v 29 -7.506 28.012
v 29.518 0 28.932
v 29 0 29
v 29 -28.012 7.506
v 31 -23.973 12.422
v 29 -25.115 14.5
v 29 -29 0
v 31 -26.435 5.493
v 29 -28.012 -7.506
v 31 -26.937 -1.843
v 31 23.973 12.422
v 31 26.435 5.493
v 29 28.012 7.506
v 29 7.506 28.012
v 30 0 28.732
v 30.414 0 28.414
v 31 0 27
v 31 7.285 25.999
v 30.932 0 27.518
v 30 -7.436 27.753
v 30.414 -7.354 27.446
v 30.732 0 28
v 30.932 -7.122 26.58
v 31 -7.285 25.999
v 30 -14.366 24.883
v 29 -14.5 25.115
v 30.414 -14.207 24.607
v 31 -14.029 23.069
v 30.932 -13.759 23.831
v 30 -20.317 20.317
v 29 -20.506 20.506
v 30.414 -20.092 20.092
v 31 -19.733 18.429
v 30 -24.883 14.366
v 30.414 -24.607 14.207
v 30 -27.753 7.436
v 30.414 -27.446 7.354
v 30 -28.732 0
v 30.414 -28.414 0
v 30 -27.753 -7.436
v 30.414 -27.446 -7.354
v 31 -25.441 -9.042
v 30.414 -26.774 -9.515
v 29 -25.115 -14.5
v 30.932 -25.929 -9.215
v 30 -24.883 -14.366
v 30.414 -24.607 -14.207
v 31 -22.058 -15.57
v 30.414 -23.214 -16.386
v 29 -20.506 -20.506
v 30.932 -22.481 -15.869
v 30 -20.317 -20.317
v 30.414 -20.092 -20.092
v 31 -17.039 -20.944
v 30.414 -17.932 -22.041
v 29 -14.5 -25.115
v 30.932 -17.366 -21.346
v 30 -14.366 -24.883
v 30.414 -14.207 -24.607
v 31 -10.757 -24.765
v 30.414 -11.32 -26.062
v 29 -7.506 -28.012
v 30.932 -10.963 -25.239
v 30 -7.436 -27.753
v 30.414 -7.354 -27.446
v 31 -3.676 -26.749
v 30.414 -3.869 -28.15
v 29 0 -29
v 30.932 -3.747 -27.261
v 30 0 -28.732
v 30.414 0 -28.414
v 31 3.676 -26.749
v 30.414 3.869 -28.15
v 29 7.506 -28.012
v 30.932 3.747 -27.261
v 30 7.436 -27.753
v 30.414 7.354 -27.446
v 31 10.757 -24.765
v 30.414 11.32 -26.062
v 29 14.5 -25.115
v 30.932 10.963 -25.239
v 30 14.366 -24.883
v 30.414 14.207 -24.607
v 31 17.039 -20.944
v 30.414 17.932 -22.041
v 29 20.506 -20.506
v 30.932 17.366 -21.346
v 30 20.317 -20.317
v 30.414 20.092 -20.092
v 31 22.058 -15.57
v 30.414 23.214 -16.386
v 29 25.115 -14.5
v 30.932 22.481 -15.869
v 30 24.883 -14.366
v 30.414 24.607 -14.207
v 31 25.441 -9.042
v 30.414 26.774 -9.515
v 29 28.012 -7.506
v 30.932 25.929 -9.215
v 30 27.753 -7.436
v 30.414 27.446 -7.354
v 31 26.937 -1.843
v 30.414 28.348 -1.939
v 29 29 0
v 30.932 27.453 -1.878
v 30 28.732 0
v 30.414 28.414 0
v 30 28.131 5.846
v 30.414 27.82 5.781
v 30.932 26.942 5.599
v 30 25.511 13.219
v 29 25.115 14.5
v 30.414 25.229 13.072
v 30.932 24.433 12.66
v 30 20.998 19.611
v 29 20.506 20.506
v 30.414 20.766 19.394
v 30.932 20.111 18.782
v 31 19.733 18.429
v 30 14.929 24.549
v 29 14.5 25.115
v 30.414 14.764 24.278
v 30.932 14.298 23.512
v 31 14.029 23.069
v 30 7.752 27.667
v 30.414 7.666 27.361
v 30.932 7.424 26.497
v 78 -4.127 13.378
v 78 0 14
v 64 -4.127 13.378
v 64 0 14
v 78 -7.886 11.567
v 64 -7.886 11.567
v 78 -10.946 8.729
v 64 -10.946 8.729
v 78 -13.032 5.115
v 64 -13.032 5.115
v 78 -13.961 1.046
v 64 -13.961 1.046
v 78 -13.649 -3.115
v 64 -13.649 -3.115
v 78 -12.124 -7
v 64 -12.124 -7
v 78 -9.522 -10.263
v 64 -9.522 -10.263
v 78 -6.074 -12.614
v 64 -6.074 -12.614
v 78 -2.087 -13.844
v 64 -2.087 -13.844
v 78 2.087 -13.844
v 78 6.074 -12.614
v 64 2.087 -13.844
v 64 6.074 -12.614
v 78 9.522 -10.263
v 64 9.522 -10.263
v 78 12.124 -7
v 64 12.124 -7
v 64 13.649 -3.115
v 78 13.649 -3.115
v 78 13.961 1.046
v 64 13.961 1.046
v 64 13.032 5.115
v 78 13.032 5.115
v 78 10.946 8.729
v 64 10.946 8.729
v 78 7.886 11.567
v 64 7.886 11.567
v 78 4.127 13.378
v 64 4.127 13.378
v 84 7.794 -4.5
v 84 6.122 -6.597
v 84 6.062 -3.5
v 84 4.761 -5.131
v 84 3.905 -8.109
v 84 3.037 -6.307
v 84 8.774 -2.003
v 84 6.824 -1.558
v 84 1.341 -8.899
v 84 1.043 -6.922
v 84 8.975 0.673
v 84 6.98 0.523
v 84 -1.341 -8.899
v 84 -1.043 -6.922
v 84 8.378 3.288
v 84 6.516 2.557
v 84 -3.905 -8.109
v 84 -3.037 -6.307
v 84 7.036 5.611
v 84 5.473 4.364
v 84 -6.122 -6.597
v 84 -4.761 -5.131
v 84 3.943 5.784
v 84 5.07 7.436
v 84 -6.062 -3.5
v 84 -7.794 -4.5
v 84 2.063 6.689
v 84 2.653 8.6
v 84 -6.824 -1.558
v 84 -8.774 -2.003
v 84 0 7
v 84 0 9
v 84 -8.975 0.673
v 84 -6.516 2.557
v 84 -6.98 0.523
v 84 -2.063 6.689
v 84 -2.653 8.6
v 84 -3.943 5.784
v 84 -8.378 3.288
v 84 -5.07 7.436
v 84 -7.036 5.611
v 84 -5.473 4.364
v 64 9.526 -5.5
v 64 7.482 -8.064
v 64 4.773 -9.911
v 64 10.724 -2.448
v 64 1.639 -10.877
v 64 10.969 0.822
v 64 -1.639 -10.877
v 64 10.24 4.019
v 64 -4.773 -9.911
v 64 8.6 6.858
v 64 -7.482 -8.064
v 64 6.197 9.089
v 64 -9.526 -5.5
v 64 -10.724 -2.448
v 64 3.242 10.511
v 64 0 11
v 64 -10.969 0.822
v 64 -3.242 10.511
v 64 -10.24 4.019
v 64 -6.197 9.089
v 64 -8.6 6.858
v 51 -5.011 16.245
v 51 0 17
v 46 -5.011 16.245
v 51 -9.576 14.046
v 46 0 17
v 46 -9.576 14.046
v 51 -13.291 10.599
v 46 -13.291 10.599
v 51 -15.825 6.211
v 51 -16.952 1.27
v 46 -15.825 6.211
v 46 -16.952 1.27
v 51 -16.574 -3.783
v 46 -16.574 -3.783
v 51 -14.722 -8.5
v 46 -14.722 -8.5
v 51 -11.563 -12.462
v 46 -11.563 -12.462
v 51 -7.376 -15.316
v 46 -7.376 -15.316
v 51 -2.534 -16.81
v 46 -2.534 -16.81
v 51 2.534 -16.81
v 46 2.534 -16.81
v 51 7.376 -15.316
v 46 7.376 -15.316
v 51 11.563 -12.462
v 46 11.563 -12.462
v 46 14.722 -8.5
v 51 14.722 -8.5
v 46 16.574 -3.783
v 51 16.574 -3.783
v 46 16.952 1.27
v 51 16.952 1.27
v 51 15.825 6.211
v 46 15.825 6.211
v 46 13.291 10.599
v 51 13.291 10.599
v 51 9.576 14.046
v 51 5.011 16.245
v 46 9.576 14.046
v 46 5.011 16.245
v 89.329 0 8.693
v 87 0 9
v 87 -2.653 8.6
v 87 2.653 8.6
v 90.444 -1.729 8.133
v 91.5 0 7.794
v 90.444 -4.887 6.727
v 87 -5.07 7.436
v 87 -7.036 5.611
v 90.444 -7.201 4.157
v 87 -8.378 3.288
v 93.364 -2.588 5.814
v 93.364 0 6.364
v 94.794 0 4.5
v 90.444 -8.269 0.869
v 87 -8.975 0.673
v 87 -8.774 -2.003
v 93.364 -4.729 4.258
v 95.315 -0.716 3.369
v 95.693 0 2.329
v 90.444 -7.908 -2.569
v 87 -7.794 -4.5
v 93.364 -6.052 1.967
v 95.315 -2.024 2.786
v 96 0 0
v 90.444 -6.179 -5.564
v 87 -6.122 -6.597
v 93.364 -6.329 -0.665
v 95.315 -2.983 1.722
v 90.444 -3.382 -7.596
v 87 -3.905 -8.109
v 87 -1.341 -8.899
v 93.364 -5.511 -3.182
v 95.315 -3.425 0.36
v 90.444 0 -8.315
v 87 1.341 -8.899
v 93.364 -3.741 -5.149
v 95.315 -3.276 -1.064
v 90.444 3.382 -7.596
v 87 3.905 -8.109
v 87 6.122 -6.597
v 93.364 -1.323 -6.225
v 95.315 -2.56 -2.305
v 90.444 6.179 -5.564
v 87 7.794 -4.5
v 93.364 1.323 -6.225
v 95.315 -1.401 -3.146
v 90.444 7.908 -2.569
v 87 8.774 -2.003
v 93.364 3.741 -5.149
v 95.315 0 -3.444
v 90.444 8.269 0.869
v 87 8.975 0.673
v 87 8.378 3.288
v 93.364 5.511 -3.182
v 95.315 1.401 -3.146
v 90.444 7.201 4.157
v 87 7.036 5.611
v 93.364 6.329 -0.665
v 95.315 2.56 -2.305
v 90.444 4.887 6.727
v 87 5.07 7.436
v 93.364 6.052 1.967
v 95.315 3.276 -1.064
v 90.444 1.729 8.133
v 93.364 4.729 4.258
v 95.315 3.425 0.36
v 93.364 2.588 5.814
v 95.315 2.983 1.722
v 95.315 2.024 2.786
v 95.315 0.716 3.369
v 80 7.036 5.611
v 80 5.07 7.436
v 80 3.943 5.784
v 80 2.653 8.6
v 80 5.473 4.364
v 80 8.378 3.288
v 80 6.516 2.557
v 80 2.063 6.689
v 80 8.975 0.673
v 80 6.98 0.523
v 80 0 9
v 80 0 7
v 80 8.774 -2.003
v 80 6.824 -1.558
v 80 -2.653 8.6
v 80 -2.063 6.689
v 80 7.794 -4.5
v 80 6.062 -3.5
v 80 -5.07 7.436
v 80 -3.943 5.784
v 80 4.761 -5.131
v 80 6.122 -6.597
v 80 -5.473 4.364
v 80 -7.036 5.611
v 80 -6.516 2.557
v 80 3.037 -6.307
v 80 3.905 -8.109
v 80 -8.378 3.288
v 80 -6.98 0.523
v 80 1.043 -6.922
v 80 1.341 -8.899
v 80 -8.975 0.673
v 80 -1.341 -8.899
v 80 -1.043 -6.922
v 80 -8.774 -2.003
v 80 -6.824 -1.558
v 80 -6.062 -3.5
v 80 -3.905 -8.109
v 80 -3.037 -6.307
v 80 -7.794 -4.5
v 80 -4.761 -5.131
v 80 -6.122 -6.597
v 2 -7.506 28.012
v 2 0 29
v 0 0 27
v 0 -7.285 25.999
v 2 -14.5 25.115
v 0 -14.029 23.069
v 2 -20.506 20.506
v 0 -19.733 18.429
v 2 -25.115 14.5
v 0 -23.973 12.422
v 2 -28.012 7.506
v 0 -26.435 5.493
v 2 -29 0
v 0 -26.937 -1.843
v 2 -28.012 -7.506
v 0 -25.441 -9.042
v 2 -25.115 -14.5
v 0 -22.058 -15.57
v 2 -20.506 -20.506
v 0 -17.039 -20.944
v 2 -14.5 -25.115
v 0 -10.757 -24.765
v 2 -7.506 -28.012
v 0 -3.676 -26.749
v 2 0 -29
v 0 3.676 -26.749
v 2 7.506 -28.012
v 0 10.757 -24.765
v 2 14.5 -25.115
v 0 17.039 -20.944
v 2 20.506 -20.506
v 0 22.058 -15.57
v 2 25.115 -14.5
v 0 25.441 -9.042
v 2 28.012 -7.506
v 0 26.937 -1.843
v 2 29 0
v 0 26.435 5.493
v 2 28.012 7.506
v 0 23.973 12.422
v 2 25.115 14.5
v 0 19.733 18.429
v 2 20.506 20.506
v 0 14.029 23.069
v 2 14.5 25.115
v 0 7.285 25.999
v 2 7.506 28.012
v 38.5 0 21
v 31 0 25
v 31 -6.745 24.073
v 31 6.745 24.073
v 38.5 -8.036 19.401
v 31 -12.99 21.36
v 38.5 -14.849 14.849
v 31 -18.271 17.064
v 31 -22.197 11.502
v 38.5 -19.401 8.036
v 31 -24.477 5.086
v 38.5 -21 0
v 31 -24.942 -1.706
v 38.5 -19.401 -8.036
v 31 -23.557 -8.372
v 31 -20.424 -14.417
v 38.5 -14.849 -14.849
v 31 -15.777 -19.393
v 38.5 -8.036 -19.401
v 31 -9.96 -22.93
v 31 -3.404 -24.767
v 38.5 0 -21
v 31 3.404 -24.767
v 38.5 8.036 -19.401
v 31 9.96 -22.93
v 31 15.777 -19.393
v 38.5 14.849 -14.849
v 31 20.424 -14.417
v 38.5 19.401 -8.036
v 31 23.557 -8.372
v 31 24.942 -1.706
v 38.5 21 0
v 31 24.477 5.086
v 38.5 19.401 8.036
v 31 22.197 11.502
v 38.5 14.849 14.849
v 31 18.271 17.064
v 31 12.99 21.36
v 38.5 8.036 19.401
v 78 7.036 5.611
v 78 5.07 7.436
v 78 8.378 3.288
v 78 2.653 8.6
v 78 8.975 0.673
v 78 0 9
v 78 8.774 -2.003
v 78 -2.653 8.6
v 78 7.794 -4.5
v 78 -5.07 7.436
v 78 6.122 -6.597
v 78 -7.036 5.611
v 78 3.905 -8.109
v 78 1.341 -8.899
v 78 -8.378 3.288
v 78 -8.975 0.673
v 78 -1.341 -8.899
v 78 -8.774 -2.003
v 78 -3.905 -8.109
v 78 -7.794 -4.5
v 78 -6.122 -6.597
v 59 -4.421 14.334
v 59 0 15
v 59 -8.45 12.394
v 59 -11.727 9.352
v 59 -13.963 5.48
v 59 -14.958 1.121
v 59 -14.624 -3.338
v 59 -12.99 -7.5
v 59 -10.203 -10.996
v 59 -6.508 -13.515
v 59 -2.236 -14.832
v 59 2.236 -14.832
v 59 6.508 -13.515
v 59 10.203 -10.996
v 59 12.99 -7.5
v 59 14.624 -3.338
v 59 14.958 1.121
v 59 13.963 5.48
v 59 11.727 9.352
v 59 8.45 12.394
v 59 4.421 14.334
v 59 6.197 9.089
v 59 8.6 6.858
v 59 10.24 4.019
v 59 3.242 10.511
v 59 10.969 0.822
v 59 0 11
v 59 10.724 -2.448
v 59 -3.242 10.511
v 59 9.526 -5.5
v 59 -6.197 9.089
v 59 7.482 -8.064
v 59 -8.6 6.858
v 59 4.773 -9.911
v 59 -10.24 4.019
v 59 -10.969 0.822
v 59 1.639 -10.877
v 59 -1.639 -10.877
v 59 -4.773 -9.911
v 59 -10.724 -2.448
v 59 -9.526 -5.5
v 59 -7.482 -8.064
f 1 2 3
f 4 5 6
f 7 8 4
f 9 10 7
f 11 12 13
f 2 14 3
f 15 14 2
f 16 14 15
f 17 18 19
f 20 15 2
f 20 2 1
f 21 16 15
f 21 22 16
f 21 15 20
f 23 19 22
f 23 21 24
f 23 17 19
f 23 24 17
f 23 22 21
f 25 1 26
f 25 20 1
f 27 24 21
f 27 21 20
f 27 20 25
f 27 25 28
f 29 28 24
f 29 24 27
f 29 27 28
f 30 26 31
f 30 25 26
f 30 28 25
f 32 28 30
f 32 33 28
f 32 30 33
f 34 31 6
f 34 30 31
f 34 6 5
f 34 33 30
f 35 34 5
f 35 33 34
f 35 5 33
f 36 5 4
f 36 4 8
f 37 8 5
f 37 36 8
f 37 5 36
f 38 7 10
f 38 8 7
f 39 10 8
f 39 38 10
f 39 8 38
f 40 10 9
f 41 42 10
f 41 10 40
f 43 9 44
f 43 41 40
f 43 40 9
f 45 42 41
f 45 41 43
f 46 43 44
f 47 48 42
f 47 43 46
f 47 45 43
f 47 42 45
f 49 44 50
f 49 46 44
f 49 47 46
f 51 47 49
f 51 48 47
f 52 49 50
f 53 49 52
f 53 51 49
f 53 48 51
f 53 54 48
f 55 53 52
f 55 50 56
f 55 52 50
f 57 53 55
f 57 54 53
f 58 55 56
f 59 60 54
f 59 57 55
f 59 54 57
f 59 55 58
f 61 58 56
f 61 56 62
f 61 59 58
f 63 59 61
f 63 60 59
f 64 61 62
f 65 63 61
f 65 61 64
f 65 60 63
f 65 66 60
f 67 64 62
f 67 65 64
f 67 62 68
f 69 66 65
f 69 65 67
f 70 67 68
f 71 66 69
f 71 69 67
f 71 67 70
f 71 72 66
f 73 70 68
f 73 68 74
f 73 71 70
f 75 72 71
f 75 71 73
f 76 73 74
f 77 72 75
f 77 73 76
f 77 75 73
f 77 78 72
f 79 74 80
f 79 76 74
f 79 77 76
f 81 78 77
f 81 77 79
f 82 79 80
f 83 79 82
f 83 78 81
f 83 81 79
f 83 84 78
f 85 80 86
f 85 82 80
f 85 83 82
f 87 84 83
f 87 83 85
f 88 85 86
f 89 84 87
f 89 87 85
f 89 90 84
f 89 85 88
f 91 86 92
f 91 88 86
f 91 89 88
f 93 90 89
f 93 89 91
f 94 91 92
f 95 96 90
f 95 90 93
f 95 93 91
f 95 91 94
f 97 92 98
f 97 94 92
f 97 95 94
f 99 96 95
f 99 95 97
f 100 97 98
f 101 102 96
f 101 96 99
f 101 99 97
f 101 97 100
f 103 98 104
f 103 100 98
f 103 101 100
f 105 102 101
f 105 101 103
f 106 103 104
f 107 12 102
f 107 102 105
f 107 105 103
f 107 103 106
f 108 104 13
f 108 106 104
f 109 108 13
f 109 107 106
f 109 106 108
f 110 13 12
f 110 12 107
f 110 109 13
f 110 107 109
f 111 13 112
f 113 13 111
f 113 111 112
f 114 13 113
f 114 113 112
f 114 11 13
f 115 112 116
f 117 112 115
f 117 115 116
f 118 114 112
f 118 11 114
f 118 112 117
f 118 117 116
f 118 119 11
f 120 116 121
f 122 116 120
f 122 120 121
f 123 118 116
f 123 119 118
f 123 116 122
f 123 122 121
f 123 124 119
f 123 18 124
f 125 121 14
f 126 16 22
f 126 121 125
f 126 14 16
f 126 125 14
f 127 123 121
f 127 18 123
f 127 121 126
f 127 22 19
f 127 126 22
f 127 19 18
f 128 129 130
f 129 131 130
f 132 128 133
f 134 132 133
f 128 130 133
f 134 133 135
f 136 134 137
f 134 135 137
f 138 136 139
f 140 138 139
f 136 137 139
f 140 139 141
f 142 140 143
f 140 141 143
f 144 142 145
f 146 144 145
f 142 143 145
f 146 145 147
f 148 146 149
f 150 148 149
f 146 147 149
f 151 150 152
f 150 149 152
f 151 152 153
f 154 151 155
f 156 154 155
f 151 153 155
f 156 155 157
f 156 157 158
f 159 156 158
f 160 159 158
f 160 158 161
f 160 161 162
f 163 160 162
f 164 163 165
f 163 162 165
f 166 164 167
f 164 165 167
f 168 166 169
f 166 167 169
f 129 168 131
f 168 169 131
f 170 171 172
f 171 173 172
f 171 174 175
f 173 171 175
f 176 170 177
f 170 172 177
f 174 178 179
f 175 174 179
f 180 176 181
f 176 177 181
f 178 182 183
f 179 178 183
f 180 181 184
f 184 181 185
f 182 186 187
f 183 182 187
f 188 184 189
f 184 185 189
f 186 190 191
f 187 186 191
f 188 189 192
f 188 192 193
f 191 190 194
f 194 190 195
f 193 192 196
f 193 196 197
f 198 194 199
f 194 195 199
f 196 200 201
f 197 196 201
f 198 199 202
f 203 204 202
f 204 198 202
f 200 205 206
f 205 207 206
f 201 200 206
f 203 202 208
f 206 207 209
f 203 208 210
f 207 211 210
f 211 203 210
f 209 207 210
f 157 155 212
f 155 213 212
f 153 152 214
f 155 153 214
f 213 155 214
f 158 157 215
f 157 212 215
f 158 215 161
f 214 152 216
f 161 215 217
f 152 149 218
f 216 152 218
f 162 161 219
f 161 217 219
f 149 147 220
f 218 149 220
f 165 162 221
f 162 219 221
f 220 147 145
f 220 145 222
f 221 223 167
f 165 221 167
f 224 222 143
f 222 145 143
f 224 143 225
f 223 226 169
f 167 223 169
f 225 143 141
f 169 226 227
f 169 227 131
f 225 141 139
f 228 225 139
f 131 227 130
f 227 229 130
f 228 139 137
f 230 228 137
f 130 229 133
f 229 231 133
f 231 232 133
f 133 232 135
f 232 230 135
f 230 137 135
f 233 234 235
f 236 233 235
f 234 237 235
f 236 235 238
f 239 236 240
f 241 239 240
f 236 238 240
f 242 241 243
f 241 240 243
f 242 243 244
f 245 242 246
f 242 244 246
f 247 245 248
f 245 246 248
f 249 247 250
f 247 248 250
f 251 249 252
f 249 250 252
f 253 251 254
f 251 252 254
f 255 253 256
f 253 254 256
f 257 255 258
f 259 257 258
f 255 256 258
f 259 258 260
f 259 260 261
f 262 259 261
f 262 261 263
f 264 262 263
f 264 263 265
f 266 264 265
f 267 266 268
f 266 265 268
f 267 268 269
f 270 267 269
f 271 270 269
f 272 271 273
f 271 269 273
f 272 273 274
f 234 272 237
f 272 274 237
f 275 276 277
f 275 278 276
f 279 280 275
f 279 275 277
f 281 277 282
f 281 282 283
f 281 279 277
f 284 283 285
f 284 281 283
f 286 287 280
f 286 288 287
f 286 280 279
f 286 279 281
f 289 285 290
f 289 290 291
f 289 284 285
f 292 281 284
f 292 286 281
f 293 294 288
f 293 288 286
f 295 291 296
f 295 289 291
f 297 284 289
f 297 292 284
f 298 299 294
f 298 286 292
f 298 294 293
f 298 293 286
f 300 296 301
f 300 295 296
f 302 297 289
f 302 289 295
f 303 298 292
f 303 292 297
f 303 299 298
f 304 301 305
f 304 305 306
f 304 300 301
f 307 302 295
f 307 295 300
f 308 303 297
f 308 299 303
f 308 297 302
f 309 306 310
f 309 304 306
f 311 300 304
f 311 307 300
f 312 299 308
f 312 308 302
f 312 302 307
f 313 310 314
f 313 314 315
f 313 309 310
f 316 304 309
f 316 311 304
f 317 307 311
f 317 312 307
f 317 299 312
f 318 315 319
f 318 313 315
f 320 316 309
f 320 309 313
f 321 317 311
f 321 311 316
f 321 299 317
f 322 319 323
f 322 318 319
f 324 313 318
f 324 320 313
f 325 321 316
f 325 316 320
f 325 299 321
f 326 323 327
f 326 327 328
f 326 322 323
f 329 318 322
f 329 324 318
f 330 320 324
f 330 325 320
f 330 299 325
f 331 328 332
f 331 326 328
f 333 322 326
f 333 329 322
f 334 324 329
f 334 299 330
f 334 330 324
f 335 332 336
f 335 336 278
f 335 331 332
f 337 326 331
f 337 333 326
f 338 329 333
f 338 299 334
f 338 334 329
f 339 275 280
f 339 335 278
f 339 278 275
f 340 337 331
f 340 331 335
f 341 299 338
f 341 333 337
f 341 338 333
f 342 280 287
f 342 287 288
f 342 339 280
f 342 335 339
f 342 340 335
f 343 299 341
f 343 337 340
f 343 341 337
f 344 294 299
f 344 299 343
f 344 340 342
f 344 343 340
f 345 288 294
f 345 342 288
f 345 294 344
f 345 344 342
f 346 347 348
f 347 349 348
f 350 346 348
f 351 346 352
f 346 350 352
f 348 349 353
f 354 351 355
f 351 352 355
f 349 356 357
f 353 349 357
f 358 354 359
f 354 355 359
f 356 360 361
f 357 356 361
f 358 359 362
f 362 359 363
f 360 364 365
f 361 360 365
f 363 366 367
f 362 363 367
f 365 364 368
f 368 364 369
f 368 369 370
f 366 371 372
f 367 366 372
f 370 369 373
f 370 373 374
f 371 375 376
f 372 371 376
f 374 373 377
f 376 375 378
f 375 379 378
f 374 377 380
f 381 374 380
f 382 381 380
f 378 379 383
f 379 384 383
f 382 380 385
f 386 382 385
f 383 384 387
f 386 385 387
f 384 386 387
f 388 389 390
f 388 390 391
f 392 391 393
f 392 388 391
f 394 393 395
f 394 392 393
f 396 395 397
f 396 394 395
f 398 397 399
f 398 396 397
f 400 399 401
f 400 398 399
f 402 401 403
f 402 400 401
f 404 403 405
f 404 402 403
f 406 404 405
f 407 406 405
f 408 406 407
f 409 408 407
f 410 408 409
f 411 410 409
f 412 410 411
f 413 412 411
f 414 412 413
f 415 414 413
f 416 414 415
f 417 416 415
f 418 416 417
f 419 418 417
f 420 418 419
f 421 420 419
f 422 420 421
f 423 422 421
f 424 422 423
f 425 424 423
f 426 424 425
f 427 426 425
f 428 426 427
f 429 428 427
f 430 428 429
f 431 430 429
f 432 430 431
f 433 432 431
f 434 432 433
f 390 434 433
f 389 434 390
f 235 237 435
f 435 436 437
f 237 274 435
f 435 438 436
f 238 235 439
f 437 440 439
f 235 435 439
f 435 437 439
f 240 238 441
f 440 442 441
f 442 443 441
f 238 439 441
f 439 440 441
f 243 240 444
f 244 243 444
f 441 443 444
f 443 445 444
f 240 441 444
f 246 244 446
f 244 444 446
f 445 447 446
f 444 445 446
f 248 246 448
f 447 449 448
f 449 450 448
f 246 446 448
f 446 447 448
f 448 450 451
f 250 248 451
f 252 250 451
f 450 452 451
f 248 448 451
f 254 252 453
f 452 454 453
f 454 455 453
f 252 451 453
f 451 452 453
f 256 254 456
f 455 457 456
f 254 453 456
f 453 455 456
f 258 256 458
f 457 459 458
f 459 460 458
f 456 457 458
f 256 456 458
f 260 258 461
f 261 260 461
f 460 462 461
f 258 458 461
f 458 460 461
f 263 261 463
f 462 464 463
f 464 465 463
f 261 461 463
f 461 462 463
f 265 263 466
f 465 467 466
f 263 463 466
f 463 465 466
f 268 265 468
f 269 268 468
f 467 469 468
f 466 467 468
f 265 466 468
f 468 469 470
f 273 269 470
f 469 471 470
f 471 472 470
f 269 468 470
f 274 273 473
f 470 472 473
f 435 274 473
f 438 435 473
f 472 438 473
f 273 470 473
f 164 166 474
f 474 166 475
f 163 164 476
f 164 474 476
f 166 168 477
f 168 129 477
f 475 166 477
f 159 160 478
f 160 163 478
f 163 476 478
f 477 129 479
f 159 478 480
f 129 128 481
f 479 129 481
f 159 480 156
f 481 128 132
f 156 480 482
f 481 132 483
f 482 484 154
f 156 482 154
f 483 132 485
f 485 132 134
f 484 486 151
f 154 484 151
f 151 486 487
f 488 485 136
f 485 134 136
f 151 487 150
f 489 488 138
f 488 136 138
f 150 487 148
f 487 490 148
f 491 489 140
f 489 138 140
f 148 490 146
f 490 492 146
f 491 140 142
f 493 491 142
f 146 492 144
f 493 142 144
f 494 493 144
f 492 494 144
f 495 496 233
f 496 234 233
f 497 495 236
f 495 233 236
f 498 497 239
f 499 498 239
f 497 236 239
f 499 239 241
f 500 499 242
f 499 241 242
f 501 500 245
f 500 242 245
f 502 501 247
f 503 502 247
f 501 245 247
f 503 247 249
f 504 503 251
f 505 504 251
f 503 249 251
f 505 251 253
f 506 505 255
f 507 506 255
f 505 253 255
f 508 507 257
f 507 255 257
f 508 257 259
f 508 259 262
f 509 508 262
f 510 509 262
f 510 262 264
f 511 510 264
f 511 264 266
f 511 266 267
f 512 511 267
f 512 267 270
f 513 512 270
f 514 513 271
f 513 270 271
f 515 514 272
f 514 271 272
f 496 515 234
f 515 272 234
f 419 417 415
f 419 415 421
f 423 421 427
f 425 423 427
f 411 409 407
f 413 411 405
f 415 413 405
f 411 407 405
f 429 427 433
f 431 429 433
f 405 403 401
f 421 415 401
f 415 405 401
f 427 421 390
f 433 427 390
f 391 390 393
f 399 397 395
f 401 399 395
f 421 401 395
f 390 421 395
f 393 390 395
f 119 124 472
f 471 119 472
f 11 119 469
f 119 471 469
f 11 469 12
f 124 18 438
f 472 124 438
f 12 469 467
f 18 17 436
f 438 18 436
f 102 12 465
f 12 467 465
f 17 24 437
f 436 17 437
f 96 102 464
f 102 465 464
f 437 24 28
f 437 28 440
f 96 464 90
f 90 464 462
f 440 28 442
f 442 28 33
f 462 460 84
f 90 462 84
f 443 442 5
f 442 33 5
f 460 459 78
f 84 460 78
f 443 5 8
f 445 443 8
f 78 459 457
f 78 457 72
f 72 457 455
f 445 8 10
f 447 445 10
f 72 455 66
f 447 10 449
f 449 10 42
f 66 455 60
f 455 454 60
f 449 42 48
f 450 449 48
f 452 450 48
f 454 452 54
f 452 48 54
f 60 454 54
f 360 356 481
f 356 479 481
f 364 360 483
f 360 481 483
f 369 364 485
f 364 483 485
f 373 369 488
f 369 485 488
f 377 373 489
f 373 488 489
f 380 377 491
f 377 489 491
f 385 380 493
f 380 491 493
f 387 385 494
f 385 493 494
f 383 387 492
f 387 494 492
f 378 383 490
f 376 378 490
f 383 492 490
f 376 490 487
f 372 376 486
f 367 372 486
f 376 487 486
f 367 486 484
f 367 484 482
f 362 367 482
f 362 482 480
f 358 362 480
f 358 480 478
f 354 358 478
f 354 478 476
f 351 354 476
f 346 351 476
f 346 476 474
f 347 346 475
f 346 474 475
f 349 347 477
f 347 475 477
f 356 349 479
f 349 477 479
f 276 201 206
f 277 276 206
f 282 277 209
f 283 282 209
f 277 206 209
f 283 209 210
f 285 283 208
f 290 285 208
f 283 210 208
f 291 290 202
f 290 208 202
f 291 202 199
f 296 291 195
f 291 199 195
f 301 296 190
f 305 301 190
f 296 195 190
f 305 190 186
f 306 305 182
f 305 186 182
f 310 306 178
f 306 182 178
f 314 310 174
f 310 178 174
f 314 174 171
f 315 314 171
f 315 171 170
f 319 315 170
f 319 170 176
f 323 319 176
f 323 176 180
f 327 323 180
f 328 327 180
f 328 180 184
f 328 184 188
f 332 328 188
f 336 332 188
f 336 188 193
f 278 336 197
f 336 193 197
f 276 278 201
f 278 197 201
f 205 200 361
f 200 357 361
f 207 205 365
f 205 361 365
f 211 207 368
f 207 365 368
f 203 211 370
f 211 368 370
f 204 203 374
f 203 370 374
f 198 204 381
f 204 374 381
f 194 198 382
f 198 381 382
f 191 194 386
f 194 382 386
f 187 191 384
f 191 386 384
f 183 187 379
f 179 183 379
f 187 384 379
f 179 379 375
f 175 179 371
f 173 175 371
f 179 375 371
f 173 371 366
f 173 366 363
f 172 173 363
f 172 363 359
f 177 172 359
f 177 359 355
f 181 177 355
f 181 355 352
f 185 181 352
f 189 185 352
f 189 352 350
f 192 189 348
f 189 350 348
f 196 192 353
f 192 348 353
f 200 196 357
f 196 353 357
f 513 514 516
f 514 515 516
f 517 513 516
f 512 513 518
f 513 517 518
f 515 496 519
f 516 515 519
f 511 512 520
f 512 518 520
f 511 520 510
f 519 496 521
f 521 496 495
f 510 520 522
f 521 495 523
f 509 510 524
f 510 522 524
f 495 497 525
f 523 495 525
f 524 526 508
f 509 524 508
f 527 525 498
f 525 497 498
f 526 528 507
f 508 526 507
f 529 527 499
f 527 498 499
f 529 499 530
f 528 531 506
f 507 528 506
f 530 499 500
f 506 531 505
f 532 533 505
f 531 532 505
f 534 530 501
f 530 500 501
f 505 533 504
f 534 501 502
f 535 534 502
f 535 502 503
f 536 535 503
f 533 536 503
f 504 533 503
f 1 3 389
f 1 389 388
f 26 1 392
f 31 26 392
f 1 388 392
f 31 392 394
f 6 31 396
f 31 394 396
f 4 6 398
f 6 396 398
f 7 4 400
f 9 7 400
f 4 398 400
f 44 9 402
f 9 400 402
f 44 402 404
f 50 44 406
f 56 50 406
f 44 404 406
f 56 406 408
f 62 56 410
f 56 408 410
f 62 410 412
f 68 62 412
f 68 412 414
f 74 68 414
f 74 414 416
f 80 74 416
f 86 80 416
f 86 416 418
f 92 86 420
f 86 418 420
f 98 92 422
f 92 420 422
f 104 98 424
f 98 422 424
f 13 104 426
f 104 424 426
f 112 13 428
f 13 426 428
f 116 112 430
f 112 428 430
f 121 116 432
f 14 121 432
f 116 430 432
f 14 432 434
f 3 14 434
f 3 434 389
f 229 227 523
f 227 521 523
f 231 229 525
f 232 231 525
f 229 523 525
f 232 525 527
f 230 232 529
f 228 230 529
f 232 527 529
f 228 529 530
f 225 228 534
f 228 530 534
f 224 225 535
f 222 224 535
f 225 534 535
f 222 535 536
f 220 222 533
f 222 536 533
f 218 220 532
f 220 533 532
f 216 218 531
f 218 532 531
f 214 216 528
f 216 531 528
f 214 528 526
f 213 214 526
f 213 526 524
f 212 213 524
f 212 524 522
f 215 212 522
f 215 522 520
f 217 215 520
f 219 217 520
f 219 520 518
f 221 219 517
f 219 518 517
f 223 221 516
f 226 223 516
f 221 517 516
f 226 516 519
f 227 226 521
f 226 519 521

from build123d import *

# Parameters (mm, degrees)
F2_SIZE = 2
F3_R    = 2
F4_R    = 9


with BuildPart() as f1:
    # F0 (on Front) → F1 (revolve)
    with BuildSketch(Plane.XZ):
        Polygon((0, 29), (0, 0), (96, 0), (96, 9), (84, 9), (84, 7), (80, 7), (80, 9), (78, 9), (78, 14), (64, 14), (64, 11), (59, 11), (59, 15), (51, 17), (46, 17), (31, 25), (31, 29), align=None)
    revolve(axis=Axis((48, 0, 0), (1, 0, 0)))

    # F2
    f2_edges = [f1.edges().sort_by_distance(p)[0] for p in [
        (0, 0, -29),
    ]]
    chamfer(f2_edges, length=F2_SIZE)

    # F3
    f3_edges = [f1.edges().sort_by_distance(p)[0] for p in [
        (31, 0, -29),
    ]]
    fillet(f3_edges, radius=F3_R)

    # F4
    f4_edges = [f1.edges().sort_by_distance(p)[0] for p in [
        (96, 0, -9),
    ]]
    fillet(f4_edges, radius=F4_R)


solid = f1.part
